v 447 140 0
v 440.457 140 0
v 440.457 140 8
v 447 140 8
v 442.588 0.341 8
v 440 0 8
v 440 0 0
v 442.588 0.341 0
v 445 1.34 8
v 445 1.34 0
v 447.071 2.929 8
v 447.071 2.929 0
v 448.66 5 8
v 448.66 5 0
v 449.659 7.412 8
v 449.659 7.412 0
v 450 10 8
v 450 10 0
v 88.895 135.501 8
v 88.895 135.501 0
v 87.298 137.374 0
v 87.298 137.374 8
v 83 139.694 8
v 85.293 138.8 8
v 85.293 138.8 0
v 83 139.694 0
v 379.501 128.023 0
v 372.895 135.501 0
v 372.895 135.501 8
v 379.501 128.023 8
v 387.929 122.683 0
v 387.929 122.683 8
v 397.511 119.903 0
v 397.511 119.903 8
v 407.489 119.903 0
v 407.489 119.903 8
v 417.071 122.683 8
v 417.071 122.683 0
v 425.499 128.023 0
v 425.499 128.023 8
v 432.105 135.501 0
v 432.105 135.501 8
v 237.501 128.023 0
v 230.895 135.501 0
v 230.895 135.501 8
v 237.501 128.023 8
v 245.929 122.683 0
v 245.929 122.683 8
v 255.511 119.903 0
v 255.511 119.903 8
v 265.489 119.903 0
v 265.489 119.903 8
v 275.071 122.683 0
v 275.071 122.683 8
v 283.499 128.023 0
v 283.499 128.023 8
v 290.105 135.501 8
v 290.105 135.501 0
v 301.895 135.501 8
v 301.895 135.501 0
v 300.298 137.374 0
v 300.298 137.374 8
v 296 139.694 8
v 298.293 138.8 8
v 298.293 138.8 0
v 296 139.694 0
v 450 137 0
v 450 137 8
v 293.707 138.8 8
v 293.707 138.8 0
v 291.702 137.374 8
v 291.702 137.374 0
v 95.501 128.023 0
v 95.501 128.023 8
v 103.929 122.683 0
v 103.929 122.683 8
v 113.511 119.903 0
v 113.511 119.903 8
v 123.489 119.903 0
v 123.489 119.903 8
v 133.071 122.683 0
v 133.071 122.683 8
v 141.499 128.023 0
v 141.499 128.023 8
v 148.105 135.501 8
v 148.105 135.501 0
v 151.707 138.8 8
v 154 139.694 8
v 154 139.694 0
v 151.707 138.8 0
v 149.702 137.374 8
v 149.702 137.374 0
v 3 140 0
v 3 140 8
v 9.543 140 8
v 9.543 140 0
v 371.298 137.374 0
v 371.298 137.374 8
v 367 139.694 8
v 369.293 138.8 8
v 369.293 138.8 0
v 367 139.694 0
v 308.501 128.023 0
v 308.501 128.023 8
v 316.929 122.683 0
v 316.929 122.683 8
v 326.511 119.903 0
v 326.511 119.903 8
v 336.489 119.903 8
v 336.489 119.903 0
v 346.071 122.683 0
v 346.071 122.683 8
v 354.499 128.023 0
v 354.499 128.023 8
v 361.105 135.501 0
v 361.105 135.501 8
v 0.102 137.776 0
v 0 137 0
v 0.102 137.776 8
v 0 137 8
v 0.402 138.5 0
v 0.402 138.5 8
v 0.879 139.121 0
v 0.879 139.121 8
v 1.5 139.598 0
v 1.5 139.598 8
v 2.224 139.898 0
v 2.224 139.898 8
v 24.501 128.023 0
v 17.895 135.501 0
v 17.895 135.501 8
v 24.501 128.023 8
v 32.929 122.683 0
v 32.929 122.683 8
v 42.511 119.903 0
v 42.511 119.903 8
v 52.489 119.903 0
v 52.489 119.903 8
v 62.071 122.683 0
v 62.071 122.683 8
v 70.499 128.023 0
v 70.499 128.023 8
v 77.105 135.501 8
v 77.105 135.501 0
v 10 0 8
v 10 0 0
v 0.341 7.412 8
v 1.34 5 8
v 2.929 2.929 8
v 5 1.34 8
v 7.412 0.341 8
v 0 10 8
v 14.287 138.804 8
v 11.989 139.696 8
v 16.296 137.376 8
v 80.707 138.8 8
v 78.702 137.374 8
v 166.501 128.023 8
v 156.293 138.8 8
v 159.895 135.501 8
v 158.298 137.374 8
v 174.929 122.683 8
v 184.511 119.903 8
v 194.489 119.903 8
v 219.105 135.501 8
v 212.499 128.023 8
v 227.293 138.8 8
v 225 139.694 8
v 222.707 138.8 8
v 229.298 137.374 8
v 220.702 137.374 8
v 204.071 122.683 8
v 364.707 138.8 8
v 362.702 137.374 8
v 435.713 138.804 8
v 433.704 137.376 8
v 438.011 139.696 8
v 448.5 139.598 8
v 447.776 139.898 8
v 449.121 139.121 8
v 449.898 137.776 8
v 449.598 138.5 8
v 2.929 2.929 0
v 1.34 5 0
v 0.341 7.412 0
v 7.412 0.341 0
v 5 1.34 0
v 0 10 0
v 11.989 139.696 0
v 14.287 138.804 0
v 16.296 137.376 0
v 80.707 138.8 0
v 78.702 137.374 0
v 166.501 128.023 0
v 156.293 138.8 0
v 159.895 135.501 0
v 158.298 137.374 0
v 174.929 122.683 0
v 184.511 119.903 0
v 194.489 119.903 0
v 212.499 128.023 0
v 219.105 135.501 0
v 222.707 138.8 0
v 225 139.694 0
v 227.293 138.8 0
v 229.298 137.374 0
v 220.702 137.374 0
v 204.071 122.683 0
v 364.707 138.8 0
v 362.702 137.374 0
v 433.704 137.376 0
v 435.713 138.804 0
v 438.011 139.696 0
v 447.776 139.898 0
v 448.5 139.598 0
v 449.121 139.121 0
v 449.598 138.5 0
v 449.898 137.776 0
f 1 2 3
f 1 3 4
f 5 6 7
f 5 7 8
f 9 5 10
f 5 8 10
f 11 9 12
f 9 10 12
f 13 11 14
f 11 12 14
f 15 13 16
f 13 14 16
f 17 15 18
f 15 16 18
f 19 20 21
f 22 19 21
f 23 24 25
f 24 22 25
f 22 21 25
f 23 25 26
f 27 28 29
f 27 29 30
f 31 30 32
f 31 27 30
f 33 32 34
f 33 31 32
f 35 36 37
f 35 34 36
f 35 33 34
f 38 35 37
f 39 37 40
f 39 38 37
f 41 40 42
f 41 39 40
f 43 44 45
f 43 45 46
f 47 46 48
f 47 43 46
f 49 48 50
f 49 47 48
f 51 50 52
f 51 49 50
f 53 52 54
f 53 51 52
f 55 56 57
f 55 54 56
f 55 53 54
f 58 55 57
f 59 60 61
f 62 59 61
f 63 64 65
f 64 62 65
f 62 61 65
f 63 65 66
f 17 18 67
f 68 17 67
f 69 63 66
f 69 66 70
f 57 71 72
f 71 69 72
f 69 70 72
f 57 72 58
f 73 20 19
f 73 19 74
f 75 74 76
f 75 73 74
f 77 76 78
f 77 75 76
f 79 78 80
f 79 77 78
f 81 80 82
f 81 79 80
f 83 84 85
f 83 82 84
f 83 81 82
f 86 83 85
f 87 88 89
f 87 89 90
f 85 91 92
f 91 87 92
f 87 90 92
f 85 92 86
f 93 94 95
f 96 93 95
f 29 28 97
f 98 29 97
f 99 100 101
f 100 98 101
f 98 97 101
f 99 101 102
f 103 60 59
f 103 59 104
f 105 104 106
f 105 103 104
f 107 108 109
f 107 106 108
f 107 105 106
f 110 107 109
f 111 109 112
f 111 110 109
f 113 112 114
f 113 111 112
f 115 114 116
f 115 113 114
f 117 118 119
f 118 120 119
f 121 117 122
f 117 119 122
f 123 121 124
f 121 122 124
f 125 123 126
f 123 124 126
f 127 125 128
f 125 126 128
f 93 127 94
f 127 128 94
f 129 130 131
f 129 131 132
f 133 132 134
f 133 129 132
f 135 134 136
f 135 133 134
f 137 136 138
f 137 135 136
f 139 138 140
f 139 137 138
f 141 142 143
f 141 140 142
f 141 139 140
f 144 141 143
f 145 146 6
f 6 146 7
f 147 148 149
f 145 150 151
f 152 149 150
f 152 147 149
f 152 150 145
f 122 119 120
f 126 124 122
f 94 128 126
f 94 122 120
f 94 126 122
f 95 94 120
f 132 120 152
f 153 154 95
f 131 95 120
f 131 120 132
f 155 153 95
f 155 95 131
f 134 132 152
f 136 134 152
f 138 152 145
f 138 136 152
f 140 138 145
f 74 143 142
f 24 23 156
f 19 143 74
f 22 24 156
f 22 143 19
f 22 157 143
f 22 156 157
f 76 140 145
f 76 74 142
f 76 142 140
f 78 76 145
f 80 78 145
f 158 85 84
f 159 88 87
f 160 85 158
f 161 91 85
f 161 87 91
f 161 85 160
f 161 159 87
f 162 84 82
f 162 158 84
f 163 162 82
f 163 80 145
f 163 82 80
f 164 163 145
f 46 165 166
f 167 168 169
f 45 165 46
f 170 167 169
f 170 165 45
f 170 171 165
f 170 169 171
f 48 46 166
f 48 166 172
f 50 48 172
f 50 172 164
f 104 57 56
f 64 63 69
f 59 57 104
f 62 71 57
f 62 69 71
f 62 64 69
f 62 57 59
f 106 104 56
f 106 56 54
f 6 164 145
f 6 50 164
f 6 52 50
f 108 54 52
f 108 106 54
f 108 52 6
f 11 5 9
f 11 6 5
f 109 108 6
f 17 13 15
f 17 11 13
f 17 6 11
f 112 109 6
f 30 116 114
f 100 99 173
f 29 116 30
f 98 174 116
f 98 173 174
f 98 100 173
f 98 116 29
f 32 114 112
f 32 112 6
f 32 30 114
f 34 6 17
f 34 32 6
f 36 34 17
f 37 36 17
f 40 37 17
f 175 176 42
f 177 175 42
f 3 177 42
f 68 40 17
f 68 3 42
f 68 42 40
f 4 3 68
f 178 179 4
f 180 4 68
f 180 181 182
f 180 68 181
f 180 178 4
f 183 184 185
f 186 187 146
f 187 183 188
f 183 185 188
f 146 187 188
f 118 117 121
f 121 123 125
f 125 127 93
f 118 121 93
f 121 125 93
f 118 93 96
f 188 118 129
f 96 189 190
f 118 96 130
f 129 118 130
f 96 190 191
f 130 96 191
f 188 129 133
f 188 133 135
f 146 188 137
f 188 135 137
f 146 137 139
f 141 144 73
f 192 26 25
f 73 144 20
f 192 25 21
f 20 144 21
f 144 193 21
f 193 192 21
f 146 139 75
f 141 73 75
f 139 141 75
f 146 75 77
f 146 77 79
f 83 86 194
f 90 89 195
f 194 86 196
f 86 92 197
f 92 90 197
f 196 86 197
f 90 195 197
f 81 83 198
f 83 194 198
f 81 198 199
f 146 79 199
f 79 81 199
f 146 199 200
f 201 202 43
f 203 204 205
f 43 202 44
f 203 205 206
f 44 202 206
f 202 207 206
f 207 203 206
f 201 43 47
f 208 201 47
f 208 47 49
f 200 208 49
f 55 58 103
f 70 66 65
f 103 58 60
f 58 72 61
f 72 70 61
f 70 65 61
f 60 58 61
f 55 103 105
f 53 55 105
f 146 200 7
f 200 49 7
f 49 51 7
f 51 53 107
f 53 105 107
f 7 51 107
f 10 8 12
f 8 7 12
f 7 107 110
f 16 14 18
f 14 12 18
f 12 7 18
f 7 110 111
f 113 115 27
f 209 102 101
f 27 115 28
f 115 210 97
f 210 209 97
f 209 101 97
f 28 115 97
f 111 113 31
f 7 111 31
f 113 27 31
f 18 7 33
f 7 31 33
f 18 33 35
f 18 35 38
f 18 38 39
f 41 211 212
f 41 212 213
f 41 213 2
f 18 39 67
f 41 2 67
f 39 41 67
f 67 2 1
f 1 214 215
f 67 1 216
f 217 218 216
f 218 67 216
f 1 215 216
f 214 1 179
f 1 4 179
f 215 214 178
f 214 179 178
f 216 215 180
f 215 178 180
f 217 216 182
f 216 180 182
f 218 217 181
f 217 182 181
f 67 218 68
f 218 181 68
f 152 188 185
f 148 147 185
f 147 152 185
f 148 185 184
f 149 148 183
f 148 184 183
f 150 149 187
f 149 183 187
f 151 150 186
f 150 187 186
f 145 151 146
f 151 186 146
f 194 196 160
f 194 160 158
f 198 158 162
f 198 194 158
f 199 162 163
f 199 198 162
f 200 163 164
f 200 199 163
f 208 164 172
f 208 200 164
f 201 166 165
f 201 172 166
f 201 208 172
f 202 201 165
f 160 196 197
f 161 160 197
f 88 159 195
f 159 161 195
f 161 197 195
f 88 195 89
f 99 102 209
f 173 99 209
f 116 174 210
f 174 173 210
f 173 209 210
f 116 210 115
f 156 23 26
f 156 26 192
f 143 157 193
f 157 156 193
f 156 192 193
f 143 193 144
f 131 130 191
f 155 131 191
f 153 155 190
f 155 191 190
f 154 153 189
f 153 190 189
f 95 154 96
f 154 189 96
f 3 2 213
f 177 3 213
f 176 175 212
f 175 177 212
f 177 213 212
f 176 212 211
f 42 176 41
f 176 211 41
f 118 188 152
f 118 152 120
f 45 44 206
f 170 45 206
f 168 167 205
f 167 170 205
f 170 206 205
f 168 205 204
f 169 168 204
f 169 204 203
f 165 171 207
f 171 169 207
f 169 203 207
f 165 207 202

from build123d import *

# Parameters (mm, degrees)
ESQUISSE1_W                  = 450
ESQUISSE1_H                  = 140
BOSS_EXTRU_1_DEPTH           = 8
ENL_V_MAT_EXTRU_1_DEPTH      = 472.342762753
ENL_V_MAT_EXTRU_1_DEPTH_BACK = 472.342762753
ESQUISSE2_R                  = 35.45
CONG_1_R                     = 10
CONG_2_R                     = 3


with BuildPart() as part:
    # Esquisse1 → Boss.-Extru.1 (new body)
    with BuildSketch(Plane.XY):
        with Locations((225, 70)):
            Rectangle(ESQUISSE1_W, ESQUISSE1_H)
    extrude(amount=BOSS_EXTRU_1_DEPTH)

    # Esquisse2 → Enlèv. mat.-Extru.1 (cut, two sides: drawn at the far end of the back side and taken through both)
    with BuildSketch(Plane.XY.offset(8).offset(-ENL_V_MAT_EXTRU_1_DEPTH_BACK)):
        with Locations((189.5, 155)):
            Circle(ESQUISSE2_R)
        with Locations((118.5, 155)):
            Circle(ESQUISSE2_R)
        with Locations((47.5, 155)):
            Circle(ESQUISSE2_R)
        with Locations((402.5, 155)):
            Circle(ESQUISSE2_R)
        with Locations((331.5, 155)):
            Circle(ESQUISSE2_R)
        with Locations((260.5, 155)):
            Circle(ESQUISSE2_R)
    extrude(amount=ENL_V_MAT_EXTRU_1_DEPTH + ENL_V_MAT_EXTRU_1_DEPTH_BACK, mode=Mode.SUBTRACT)

    # Congé1
    # the kernel refuses this fillet: 10 mm, written as the material it takes off along each edge
    with BuildSketch(Plane(origin=(221.620126089, 140, -14.591152386), x_dir=(-0.4878841610391912, -0.87290838316921, 0), z_dir=(0, 0, 1)), Plane(origin=(150.620126089, 140, -14.591152386), x_dir=(-0.4878841610391912, -0.87290838316921, 0), z_dir=(0, 0, 1)), Plane(origin=(79.620126089, 140, -14.591152386), x_dir=(-0.4878841610391912, -0.87290838316921, 0), z_dir=(0, 0, 1)), Plane(origin=(363.620126089, 140, -14.591152386), x_dir=(-0.48788416103919546, -0.8729083831692078, 0), z_dir=(0, 0, 1)), Plane(origin=(292.620126089, 140, -14.591152386), x_dir=(-0.48788416103919546, -0.8729083831692078, 0), z_dir=(0, 0, 1))) as cong_1_piece_1:
        with BuildLine():
            CenterArc((5.881566976, 9.973537305), CONG_1_R, 209.201608238, 56.629213342)
            Line((-2.847516856, 5.094695695), (0, 0))
            ThreePointArc((0, 0), (2.577275022, 0.093810253), (5.154550044, 0))
        make_face()
    extrude(amount=37.182304771, mode=Mode.SUBTRACT)
    with BuildSketch(Plane(origin=(157.379873911, 140, -14.591152386), x_dir=(-1, 0, 0), z_dir=(0, 0, 1)), Plane(origin=(86.379873911, 140, -14.591152386), x_dir=(-1, 0, 0), z_dir=(0, 0, 1)), Plane(origin=(15.379873911, 140, -14.591152386), x_dir=(-1, 0, 0), z_dir=(0, 0, 1)), Plane(origin=(370.379873911, 140, -14.591152386), x_dir=(-1, 0, 0), z_dir=(0, 0, 1)), Plane(origin=(299.379873911, 140, -14.591152386), x_dir=(-1, 0, 0), z_dir=(0, 0, 1)), Plane(origin=(228.379873911, 140, -14.591152386), x_dir=(-1, 0, 0), z_dir=(0, 0, 1))) as cong_1_piece_2:
        with BuildLine():
            CenterArc((5.836460954, 10), CONG_1_R, 213.370786658, 56.629213342)
            ThreePointArc((-2.514823324, 4.499449945), (-1.175523906, 2.295493509), (0, 0))
            Line((0, 0), (5.836460954, 0))
        make_face()
    extrude(amount=37.182304771, mode=Mode.SUBTRACT)
    with BuildSketch(Plane(origin=(434.620126089, 140, -14.591152386), x_dir=(1, 0, 0), z_dir=(0, 0, 1))) as cong_1_piece_3:
        with BuildLine():
            CenterArc((5.836460954, -10), CONG_1_R, 90, 56.629213342)
            ThreePointArc((-2.514823324, -4.499449945), (-1.175523906, -2.295493509), (0, 0))
            Line((0, 0), (5.836460954, 0))
        make_face()
    extrude(amount=37.182304771, mode=Mode.SUBTRACT)
    with BuildSketch(Plane(origin=(450, 0, -25), x_dir=(-1, 0, 0), z_dir=(0, 0, 1))) as cong_1_piece_4:
        with BuildLine():
            CenterArc((CONG_1_R, -CONG_1_R), CONG_1_R, 90, 90)
            Line((0, -CONG_1_R), (0, 0))
            Line((0, 0), (CONG_1_R, 0))
        make_face()
    extrude(amount=58, mode=Mode.SUBTRACT)
    with BuildSketch(Plane(origin=(0, 0, -25), x_dir=(1, 0, 0), z_dir=(0, 0, 1))) as cong_1_piece_5:
        with BuildLine():
            CenterArc((CONG_1_R, CONG_1_R), CONG_1_R, 180, 90)
            Line((0, CONG_1_R), (0, 0))
            Line((0, 0), (CONG_1_R, 0))
        make_face()
    extrude(amount=58, mode=Mode.SUBTRACT)

    # Congé2
    cong_2_edges = [part.edges().sort_by_distance(p)[0] for p in [
        (0, 140, 4),
        (450, 140, 4),
    ]]
    fillet(cong_2_edges, radius=CONG_2_R)


solid = part.part
